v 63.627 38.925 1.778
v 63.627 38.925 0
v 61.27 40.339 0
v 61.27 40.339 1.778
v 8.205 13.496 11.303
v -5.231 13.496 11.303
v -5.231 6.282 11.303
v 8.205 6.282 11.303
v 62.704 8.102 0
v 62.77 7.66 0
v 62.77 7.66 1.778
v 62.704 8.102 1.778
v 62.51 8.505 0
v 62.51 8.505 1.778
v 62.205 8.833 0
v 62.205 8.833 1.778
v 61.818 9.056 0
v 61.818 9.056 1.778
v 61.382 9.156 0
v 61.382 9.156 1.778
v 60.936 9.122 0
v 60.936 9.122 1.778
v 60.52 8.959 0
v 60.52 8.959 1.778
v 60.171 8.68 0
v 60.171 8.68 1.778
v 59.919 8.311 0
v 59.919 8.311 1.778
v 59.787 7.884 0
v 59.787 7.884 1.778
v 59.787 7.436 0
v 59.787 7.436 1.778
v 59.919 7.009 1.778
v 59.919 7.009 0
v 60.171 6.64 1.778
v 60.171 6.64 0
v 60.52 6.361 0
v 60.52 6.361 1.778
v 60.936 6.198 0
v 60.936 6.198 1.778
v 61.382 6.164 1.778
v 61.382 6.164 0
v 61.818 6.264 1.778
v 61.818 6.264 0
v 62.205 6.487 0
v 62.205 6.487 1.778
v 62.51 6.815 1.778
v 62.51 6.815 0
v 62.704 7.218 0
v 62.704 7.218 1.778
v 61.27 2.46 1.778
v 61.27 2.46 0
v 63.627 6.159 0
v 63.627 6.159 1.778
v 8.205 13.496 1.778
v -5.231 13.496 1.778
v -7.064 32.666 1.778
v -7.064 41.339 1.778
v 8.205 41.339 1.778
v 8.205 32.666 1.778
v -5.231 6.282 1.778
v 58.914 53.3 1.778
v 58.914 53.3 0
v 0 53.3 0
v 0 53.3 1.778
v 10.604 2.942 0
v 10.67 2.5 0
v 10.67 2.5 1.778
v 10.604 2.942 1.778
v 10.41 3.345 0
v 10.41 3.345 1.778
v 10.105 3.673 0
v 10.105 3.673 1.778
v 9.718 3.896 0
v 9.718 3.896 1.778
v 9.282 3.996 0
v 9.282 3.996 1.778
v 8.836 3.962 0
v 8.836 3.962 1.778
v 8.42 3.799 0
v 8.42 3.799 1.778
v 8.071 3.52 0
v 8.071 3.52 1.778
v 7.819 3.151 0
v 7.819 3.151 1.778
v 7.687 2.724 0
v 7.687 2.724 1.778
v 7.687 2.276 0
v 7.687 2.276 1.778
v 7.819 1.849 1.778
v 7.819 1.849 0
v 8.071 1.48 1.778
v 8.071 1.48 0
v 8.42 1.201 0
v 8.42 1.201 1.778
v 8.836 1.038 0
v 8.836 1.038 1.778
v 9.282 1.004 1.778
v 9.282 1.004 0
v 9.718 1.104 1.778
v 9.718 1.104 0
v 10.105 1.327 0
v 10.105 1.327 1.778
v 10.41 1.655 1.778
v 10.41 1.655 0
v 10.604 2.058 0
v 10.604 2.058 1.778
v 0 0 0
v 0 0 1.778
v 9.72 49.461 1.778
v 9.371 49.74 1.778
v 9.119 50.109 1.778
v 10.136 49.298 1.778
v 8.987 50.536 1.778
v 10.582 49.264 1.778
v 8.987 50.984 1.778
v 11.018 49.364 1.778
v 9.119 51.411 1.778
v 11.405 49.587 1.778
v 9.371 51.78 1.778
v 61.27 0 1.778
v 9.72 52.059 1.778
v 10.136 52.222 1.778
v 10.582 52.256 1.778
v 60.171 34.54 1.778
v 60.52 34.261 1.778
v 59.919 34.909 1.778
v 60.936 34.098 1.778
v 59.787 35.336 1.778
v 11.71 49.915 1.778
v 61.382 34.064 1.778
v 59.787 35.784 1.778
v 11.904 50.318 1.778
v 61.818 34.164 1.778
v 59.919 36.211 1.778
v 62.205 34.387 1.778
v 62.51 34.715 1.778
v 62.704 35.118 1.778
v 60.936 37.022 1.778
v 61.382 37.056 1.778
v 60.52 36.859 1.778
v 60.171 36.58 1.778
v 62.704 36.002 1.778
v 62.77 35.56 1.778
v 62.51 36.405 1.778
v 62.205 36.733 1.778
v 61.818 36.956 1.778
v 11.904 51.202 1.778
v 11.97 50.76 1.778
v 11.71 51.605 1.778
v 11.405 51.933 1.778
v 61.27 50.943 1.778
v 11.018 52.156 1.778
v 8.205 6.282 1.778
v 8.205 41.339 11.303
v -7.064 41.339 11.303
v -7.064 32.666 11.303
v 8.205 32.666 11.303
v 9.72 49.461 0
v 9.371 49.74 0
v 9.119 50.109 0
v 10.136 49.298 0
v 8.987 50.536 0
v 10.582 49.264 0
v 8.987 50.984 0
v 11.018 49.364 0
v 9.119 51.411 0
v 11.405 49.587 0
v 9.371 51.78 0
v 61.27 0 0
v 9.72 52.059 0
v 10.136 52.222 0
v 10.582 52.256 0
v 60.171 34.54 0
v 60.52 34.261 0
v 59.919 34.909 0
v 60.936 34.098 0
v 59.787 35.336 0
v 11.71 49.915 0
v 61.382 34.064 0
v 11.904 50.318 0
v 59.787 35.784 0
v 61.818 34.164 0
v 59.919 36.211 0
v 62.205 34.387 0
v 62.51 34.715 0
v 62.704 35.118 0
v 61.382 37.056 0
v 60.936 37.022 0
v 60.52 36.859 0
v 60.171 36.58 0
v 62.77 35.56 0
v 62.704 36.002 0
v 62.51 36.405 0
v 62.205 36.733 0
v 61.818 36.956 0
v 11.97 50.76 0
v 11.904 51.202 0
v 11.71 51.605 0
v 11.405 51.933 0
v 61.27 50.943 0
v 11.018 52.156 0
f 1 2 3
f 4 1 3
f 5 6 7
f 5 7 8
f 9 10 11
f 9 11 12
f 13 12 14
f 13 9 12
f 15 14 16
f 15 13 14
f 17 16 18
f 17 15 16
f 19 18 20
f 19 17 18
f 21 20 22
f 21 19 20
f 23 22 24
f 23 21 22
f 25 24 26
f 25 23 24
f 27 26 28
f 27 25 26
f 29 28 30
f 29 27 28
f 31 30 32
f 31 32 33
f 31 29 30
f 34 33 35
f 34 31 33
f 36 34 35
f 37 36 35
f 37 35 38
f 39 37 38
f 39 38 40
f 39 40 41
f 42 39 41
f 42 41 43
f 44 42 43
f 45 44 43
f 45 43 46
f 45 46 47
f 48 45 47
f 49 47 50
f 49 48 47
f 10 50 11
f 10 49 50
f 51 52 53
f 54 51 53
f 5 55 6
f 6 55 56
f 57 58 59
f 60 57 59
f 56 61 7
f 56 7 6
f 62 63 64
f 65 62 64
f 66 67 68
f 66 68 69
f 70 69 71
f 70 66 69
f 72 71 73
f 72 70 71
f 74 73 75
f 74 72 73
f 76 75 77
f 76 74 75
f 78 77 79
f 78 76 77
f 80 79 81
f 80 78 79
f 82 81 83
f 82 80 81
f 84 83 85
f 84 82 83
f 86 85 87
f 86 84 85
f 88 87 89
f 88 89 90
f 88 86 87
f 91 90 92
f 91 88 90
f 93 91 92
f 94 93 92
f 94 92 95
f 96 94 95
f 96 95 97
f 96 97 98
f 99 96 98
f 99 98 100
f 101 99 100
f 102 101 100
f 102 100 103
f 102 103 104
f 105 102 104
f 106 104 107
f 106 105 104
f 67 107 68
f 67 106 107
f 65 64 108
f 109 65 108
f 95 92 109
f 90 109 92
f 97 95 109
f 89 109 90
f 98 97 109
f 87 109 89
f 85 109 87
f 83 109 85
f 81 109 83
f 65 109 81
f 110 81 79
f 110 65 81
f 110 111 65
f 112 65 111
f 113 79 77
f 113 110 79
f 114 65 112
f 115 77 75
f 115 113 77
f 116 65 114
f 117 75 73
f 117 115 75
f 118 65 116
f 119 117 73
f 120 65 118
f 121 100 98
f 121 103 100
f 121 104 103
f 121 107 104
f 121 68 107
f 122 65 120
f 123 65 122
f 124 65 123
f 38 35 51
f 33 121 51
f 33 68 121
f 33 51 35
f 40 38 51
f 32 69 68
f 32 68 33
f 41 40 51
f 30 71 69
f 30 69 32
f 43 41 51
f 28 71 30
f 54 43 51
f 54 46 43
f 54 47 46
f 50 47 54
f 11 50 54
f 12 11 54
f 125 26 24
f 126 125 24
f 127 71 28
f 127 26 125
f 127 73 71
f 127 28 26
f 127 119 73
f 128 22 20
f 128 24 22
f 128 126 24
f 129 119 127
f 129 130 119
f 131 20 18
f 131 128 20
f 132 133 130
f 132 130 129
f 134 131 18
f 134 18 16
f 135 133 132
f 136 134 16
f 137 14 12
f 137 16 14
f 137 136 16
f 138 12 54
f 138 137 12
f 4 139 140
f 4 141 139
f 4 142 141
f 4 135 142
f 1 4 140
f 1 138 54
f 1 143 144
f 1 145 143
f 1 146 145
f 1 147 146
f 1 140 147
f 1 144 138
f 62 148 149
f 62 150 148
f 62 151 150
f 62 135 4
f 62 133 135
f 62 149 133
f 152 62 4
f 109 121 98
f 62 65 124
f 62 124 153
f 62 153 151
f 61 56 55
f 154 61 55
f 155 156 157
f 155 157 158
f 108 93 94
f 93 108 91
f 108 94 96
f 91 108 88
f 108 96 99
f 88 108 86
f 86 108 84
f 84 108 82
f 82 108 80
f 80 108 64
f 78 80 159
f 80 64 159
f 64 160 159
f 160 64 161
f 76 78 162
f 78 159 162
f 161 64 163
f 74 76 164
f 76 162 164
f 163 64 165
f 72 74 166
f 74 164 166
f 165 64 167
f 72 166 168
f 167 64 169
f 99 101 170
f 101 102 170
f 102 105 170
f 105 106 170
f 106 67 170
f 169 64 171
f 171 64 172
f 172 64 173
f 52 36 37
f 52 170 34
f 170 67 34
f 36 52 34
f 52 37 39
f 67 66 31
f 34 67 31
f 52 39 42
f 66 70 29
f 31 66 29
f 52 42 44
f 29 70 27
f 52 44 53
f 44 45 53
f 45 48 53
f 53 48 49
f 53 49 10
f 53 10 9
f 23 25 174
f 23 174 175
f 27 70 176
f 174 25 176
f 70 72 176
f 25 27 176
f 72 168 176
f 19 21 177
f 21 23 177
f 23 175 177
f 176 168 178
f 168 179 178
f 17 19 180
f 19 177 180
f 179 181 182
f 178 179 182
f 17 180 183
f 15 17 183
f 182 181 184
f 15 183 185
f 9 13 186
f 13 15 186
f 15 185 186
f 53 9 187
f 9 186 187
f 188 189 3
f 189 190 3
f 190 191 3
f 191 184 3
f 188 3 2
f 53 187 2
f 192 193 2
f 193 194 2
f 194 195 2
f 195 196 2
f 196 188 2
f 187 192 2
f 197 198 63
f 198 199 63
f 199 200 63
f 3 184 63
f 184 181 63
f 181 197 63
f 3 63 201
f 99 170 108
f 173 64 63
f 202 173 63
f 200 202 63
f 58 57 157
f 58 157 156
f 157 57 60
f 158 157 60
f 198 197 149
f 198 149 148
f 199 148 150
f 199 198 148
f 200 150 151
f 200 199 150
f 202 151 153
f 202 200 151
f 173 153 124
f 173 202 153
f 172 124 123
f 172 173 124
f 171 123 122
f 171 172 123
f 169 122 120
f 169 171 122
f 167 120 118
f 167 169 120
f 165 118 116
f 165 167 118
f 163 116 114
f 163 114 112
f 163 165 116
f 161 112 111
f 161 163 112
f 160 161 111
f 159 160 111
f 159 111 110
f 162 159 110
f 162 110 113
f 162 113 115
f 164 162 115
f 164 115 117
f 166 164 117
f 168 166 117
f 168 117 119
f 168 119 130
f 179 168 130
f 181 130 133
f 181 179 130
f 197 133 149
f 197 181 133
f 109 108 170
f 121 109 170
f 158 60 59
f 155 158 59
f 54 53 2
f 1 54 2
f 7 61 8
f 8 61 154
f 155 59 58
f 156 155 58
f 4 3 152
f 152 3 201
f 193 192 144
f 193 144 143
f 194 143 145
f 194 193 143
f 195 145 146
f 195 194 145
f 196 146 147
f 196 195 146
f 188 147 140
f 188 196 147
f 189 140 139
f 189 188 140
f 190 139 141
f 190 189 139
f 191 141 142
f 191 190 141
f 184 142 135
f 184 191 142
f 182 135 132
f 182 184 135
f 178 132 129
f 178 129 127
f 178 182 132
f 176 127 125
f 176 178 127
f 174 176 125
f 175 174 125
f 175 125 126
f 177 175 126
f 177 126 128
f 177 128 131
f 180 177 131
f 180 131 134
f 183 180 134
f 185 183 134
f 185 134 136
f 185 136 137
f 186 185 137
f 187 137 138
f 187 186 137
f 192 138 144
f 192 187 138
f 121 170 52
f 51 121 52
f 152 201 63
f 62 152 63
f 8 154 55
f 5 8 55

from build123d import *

# Parameters (mm, degrees)
F0_R     = 1.5
F1_DEPTH = 1.778
F2_W     = 7.063547
F2_H     = 8.672543
F2_W_2   = 5.23132
F2_H_2   = 7.2136
F2_W_3   = 8.205013
F2_W_4   = 8.20528
F3_DEPTH = 9.525


with BuildPart() as f1:
    # F0 (on Top) → F1 (new body)
    with BuildSketch(Plane.XY):
        Polygon((0, 53.3), (0, 0), (61.270186, 0), (61.270186, 2.46), (63.626732, 6.159072), (63.626732, 38.925072), (61.270186, 40.338999), (61.270186, 50.943454), (58.91364, 53.3), align=None)
        with Locations((9.170186, 2.5)):
            Circle(F0_R, mode=Mode.SUBTRACT)
        with Locations((61.270186, 7.66)):
            Circle(F0_R, mode=Mode.SUBTRACT)
        with Locations((10.470186, 50.76)):
            Circle(F0_R, mode=Mode.SUBTRACT)
        with Locations((61.270186, 35.56)):
            Circle(F0_R, mode=Mode.SUBTRACT)
    extrude(amount=F1_DEPTH)


with BuildPart() as f3:
    # F2 (on face) → F3 (new body)
    with BuildSketch(Plane.XY.offset(1.778)):
        with Locations((-3.531773, 37.0026)):
            Rectangle(F2_W, F2_H)
        with Locations((-2.61566, 9.889059)):
            Rectangle(F2_W_2, F2_H_2)
        with Locations((4.102506, 37.0026)):
            Rectangle(F2_W_3, F2_H)
        with Locations((4.10264, 9.889059)):
            Rectangle(F2_W_4, F2_H_2)
    extrude(amount=F3_DEPTH)


solid = Compound([f1.part, f3.part])
